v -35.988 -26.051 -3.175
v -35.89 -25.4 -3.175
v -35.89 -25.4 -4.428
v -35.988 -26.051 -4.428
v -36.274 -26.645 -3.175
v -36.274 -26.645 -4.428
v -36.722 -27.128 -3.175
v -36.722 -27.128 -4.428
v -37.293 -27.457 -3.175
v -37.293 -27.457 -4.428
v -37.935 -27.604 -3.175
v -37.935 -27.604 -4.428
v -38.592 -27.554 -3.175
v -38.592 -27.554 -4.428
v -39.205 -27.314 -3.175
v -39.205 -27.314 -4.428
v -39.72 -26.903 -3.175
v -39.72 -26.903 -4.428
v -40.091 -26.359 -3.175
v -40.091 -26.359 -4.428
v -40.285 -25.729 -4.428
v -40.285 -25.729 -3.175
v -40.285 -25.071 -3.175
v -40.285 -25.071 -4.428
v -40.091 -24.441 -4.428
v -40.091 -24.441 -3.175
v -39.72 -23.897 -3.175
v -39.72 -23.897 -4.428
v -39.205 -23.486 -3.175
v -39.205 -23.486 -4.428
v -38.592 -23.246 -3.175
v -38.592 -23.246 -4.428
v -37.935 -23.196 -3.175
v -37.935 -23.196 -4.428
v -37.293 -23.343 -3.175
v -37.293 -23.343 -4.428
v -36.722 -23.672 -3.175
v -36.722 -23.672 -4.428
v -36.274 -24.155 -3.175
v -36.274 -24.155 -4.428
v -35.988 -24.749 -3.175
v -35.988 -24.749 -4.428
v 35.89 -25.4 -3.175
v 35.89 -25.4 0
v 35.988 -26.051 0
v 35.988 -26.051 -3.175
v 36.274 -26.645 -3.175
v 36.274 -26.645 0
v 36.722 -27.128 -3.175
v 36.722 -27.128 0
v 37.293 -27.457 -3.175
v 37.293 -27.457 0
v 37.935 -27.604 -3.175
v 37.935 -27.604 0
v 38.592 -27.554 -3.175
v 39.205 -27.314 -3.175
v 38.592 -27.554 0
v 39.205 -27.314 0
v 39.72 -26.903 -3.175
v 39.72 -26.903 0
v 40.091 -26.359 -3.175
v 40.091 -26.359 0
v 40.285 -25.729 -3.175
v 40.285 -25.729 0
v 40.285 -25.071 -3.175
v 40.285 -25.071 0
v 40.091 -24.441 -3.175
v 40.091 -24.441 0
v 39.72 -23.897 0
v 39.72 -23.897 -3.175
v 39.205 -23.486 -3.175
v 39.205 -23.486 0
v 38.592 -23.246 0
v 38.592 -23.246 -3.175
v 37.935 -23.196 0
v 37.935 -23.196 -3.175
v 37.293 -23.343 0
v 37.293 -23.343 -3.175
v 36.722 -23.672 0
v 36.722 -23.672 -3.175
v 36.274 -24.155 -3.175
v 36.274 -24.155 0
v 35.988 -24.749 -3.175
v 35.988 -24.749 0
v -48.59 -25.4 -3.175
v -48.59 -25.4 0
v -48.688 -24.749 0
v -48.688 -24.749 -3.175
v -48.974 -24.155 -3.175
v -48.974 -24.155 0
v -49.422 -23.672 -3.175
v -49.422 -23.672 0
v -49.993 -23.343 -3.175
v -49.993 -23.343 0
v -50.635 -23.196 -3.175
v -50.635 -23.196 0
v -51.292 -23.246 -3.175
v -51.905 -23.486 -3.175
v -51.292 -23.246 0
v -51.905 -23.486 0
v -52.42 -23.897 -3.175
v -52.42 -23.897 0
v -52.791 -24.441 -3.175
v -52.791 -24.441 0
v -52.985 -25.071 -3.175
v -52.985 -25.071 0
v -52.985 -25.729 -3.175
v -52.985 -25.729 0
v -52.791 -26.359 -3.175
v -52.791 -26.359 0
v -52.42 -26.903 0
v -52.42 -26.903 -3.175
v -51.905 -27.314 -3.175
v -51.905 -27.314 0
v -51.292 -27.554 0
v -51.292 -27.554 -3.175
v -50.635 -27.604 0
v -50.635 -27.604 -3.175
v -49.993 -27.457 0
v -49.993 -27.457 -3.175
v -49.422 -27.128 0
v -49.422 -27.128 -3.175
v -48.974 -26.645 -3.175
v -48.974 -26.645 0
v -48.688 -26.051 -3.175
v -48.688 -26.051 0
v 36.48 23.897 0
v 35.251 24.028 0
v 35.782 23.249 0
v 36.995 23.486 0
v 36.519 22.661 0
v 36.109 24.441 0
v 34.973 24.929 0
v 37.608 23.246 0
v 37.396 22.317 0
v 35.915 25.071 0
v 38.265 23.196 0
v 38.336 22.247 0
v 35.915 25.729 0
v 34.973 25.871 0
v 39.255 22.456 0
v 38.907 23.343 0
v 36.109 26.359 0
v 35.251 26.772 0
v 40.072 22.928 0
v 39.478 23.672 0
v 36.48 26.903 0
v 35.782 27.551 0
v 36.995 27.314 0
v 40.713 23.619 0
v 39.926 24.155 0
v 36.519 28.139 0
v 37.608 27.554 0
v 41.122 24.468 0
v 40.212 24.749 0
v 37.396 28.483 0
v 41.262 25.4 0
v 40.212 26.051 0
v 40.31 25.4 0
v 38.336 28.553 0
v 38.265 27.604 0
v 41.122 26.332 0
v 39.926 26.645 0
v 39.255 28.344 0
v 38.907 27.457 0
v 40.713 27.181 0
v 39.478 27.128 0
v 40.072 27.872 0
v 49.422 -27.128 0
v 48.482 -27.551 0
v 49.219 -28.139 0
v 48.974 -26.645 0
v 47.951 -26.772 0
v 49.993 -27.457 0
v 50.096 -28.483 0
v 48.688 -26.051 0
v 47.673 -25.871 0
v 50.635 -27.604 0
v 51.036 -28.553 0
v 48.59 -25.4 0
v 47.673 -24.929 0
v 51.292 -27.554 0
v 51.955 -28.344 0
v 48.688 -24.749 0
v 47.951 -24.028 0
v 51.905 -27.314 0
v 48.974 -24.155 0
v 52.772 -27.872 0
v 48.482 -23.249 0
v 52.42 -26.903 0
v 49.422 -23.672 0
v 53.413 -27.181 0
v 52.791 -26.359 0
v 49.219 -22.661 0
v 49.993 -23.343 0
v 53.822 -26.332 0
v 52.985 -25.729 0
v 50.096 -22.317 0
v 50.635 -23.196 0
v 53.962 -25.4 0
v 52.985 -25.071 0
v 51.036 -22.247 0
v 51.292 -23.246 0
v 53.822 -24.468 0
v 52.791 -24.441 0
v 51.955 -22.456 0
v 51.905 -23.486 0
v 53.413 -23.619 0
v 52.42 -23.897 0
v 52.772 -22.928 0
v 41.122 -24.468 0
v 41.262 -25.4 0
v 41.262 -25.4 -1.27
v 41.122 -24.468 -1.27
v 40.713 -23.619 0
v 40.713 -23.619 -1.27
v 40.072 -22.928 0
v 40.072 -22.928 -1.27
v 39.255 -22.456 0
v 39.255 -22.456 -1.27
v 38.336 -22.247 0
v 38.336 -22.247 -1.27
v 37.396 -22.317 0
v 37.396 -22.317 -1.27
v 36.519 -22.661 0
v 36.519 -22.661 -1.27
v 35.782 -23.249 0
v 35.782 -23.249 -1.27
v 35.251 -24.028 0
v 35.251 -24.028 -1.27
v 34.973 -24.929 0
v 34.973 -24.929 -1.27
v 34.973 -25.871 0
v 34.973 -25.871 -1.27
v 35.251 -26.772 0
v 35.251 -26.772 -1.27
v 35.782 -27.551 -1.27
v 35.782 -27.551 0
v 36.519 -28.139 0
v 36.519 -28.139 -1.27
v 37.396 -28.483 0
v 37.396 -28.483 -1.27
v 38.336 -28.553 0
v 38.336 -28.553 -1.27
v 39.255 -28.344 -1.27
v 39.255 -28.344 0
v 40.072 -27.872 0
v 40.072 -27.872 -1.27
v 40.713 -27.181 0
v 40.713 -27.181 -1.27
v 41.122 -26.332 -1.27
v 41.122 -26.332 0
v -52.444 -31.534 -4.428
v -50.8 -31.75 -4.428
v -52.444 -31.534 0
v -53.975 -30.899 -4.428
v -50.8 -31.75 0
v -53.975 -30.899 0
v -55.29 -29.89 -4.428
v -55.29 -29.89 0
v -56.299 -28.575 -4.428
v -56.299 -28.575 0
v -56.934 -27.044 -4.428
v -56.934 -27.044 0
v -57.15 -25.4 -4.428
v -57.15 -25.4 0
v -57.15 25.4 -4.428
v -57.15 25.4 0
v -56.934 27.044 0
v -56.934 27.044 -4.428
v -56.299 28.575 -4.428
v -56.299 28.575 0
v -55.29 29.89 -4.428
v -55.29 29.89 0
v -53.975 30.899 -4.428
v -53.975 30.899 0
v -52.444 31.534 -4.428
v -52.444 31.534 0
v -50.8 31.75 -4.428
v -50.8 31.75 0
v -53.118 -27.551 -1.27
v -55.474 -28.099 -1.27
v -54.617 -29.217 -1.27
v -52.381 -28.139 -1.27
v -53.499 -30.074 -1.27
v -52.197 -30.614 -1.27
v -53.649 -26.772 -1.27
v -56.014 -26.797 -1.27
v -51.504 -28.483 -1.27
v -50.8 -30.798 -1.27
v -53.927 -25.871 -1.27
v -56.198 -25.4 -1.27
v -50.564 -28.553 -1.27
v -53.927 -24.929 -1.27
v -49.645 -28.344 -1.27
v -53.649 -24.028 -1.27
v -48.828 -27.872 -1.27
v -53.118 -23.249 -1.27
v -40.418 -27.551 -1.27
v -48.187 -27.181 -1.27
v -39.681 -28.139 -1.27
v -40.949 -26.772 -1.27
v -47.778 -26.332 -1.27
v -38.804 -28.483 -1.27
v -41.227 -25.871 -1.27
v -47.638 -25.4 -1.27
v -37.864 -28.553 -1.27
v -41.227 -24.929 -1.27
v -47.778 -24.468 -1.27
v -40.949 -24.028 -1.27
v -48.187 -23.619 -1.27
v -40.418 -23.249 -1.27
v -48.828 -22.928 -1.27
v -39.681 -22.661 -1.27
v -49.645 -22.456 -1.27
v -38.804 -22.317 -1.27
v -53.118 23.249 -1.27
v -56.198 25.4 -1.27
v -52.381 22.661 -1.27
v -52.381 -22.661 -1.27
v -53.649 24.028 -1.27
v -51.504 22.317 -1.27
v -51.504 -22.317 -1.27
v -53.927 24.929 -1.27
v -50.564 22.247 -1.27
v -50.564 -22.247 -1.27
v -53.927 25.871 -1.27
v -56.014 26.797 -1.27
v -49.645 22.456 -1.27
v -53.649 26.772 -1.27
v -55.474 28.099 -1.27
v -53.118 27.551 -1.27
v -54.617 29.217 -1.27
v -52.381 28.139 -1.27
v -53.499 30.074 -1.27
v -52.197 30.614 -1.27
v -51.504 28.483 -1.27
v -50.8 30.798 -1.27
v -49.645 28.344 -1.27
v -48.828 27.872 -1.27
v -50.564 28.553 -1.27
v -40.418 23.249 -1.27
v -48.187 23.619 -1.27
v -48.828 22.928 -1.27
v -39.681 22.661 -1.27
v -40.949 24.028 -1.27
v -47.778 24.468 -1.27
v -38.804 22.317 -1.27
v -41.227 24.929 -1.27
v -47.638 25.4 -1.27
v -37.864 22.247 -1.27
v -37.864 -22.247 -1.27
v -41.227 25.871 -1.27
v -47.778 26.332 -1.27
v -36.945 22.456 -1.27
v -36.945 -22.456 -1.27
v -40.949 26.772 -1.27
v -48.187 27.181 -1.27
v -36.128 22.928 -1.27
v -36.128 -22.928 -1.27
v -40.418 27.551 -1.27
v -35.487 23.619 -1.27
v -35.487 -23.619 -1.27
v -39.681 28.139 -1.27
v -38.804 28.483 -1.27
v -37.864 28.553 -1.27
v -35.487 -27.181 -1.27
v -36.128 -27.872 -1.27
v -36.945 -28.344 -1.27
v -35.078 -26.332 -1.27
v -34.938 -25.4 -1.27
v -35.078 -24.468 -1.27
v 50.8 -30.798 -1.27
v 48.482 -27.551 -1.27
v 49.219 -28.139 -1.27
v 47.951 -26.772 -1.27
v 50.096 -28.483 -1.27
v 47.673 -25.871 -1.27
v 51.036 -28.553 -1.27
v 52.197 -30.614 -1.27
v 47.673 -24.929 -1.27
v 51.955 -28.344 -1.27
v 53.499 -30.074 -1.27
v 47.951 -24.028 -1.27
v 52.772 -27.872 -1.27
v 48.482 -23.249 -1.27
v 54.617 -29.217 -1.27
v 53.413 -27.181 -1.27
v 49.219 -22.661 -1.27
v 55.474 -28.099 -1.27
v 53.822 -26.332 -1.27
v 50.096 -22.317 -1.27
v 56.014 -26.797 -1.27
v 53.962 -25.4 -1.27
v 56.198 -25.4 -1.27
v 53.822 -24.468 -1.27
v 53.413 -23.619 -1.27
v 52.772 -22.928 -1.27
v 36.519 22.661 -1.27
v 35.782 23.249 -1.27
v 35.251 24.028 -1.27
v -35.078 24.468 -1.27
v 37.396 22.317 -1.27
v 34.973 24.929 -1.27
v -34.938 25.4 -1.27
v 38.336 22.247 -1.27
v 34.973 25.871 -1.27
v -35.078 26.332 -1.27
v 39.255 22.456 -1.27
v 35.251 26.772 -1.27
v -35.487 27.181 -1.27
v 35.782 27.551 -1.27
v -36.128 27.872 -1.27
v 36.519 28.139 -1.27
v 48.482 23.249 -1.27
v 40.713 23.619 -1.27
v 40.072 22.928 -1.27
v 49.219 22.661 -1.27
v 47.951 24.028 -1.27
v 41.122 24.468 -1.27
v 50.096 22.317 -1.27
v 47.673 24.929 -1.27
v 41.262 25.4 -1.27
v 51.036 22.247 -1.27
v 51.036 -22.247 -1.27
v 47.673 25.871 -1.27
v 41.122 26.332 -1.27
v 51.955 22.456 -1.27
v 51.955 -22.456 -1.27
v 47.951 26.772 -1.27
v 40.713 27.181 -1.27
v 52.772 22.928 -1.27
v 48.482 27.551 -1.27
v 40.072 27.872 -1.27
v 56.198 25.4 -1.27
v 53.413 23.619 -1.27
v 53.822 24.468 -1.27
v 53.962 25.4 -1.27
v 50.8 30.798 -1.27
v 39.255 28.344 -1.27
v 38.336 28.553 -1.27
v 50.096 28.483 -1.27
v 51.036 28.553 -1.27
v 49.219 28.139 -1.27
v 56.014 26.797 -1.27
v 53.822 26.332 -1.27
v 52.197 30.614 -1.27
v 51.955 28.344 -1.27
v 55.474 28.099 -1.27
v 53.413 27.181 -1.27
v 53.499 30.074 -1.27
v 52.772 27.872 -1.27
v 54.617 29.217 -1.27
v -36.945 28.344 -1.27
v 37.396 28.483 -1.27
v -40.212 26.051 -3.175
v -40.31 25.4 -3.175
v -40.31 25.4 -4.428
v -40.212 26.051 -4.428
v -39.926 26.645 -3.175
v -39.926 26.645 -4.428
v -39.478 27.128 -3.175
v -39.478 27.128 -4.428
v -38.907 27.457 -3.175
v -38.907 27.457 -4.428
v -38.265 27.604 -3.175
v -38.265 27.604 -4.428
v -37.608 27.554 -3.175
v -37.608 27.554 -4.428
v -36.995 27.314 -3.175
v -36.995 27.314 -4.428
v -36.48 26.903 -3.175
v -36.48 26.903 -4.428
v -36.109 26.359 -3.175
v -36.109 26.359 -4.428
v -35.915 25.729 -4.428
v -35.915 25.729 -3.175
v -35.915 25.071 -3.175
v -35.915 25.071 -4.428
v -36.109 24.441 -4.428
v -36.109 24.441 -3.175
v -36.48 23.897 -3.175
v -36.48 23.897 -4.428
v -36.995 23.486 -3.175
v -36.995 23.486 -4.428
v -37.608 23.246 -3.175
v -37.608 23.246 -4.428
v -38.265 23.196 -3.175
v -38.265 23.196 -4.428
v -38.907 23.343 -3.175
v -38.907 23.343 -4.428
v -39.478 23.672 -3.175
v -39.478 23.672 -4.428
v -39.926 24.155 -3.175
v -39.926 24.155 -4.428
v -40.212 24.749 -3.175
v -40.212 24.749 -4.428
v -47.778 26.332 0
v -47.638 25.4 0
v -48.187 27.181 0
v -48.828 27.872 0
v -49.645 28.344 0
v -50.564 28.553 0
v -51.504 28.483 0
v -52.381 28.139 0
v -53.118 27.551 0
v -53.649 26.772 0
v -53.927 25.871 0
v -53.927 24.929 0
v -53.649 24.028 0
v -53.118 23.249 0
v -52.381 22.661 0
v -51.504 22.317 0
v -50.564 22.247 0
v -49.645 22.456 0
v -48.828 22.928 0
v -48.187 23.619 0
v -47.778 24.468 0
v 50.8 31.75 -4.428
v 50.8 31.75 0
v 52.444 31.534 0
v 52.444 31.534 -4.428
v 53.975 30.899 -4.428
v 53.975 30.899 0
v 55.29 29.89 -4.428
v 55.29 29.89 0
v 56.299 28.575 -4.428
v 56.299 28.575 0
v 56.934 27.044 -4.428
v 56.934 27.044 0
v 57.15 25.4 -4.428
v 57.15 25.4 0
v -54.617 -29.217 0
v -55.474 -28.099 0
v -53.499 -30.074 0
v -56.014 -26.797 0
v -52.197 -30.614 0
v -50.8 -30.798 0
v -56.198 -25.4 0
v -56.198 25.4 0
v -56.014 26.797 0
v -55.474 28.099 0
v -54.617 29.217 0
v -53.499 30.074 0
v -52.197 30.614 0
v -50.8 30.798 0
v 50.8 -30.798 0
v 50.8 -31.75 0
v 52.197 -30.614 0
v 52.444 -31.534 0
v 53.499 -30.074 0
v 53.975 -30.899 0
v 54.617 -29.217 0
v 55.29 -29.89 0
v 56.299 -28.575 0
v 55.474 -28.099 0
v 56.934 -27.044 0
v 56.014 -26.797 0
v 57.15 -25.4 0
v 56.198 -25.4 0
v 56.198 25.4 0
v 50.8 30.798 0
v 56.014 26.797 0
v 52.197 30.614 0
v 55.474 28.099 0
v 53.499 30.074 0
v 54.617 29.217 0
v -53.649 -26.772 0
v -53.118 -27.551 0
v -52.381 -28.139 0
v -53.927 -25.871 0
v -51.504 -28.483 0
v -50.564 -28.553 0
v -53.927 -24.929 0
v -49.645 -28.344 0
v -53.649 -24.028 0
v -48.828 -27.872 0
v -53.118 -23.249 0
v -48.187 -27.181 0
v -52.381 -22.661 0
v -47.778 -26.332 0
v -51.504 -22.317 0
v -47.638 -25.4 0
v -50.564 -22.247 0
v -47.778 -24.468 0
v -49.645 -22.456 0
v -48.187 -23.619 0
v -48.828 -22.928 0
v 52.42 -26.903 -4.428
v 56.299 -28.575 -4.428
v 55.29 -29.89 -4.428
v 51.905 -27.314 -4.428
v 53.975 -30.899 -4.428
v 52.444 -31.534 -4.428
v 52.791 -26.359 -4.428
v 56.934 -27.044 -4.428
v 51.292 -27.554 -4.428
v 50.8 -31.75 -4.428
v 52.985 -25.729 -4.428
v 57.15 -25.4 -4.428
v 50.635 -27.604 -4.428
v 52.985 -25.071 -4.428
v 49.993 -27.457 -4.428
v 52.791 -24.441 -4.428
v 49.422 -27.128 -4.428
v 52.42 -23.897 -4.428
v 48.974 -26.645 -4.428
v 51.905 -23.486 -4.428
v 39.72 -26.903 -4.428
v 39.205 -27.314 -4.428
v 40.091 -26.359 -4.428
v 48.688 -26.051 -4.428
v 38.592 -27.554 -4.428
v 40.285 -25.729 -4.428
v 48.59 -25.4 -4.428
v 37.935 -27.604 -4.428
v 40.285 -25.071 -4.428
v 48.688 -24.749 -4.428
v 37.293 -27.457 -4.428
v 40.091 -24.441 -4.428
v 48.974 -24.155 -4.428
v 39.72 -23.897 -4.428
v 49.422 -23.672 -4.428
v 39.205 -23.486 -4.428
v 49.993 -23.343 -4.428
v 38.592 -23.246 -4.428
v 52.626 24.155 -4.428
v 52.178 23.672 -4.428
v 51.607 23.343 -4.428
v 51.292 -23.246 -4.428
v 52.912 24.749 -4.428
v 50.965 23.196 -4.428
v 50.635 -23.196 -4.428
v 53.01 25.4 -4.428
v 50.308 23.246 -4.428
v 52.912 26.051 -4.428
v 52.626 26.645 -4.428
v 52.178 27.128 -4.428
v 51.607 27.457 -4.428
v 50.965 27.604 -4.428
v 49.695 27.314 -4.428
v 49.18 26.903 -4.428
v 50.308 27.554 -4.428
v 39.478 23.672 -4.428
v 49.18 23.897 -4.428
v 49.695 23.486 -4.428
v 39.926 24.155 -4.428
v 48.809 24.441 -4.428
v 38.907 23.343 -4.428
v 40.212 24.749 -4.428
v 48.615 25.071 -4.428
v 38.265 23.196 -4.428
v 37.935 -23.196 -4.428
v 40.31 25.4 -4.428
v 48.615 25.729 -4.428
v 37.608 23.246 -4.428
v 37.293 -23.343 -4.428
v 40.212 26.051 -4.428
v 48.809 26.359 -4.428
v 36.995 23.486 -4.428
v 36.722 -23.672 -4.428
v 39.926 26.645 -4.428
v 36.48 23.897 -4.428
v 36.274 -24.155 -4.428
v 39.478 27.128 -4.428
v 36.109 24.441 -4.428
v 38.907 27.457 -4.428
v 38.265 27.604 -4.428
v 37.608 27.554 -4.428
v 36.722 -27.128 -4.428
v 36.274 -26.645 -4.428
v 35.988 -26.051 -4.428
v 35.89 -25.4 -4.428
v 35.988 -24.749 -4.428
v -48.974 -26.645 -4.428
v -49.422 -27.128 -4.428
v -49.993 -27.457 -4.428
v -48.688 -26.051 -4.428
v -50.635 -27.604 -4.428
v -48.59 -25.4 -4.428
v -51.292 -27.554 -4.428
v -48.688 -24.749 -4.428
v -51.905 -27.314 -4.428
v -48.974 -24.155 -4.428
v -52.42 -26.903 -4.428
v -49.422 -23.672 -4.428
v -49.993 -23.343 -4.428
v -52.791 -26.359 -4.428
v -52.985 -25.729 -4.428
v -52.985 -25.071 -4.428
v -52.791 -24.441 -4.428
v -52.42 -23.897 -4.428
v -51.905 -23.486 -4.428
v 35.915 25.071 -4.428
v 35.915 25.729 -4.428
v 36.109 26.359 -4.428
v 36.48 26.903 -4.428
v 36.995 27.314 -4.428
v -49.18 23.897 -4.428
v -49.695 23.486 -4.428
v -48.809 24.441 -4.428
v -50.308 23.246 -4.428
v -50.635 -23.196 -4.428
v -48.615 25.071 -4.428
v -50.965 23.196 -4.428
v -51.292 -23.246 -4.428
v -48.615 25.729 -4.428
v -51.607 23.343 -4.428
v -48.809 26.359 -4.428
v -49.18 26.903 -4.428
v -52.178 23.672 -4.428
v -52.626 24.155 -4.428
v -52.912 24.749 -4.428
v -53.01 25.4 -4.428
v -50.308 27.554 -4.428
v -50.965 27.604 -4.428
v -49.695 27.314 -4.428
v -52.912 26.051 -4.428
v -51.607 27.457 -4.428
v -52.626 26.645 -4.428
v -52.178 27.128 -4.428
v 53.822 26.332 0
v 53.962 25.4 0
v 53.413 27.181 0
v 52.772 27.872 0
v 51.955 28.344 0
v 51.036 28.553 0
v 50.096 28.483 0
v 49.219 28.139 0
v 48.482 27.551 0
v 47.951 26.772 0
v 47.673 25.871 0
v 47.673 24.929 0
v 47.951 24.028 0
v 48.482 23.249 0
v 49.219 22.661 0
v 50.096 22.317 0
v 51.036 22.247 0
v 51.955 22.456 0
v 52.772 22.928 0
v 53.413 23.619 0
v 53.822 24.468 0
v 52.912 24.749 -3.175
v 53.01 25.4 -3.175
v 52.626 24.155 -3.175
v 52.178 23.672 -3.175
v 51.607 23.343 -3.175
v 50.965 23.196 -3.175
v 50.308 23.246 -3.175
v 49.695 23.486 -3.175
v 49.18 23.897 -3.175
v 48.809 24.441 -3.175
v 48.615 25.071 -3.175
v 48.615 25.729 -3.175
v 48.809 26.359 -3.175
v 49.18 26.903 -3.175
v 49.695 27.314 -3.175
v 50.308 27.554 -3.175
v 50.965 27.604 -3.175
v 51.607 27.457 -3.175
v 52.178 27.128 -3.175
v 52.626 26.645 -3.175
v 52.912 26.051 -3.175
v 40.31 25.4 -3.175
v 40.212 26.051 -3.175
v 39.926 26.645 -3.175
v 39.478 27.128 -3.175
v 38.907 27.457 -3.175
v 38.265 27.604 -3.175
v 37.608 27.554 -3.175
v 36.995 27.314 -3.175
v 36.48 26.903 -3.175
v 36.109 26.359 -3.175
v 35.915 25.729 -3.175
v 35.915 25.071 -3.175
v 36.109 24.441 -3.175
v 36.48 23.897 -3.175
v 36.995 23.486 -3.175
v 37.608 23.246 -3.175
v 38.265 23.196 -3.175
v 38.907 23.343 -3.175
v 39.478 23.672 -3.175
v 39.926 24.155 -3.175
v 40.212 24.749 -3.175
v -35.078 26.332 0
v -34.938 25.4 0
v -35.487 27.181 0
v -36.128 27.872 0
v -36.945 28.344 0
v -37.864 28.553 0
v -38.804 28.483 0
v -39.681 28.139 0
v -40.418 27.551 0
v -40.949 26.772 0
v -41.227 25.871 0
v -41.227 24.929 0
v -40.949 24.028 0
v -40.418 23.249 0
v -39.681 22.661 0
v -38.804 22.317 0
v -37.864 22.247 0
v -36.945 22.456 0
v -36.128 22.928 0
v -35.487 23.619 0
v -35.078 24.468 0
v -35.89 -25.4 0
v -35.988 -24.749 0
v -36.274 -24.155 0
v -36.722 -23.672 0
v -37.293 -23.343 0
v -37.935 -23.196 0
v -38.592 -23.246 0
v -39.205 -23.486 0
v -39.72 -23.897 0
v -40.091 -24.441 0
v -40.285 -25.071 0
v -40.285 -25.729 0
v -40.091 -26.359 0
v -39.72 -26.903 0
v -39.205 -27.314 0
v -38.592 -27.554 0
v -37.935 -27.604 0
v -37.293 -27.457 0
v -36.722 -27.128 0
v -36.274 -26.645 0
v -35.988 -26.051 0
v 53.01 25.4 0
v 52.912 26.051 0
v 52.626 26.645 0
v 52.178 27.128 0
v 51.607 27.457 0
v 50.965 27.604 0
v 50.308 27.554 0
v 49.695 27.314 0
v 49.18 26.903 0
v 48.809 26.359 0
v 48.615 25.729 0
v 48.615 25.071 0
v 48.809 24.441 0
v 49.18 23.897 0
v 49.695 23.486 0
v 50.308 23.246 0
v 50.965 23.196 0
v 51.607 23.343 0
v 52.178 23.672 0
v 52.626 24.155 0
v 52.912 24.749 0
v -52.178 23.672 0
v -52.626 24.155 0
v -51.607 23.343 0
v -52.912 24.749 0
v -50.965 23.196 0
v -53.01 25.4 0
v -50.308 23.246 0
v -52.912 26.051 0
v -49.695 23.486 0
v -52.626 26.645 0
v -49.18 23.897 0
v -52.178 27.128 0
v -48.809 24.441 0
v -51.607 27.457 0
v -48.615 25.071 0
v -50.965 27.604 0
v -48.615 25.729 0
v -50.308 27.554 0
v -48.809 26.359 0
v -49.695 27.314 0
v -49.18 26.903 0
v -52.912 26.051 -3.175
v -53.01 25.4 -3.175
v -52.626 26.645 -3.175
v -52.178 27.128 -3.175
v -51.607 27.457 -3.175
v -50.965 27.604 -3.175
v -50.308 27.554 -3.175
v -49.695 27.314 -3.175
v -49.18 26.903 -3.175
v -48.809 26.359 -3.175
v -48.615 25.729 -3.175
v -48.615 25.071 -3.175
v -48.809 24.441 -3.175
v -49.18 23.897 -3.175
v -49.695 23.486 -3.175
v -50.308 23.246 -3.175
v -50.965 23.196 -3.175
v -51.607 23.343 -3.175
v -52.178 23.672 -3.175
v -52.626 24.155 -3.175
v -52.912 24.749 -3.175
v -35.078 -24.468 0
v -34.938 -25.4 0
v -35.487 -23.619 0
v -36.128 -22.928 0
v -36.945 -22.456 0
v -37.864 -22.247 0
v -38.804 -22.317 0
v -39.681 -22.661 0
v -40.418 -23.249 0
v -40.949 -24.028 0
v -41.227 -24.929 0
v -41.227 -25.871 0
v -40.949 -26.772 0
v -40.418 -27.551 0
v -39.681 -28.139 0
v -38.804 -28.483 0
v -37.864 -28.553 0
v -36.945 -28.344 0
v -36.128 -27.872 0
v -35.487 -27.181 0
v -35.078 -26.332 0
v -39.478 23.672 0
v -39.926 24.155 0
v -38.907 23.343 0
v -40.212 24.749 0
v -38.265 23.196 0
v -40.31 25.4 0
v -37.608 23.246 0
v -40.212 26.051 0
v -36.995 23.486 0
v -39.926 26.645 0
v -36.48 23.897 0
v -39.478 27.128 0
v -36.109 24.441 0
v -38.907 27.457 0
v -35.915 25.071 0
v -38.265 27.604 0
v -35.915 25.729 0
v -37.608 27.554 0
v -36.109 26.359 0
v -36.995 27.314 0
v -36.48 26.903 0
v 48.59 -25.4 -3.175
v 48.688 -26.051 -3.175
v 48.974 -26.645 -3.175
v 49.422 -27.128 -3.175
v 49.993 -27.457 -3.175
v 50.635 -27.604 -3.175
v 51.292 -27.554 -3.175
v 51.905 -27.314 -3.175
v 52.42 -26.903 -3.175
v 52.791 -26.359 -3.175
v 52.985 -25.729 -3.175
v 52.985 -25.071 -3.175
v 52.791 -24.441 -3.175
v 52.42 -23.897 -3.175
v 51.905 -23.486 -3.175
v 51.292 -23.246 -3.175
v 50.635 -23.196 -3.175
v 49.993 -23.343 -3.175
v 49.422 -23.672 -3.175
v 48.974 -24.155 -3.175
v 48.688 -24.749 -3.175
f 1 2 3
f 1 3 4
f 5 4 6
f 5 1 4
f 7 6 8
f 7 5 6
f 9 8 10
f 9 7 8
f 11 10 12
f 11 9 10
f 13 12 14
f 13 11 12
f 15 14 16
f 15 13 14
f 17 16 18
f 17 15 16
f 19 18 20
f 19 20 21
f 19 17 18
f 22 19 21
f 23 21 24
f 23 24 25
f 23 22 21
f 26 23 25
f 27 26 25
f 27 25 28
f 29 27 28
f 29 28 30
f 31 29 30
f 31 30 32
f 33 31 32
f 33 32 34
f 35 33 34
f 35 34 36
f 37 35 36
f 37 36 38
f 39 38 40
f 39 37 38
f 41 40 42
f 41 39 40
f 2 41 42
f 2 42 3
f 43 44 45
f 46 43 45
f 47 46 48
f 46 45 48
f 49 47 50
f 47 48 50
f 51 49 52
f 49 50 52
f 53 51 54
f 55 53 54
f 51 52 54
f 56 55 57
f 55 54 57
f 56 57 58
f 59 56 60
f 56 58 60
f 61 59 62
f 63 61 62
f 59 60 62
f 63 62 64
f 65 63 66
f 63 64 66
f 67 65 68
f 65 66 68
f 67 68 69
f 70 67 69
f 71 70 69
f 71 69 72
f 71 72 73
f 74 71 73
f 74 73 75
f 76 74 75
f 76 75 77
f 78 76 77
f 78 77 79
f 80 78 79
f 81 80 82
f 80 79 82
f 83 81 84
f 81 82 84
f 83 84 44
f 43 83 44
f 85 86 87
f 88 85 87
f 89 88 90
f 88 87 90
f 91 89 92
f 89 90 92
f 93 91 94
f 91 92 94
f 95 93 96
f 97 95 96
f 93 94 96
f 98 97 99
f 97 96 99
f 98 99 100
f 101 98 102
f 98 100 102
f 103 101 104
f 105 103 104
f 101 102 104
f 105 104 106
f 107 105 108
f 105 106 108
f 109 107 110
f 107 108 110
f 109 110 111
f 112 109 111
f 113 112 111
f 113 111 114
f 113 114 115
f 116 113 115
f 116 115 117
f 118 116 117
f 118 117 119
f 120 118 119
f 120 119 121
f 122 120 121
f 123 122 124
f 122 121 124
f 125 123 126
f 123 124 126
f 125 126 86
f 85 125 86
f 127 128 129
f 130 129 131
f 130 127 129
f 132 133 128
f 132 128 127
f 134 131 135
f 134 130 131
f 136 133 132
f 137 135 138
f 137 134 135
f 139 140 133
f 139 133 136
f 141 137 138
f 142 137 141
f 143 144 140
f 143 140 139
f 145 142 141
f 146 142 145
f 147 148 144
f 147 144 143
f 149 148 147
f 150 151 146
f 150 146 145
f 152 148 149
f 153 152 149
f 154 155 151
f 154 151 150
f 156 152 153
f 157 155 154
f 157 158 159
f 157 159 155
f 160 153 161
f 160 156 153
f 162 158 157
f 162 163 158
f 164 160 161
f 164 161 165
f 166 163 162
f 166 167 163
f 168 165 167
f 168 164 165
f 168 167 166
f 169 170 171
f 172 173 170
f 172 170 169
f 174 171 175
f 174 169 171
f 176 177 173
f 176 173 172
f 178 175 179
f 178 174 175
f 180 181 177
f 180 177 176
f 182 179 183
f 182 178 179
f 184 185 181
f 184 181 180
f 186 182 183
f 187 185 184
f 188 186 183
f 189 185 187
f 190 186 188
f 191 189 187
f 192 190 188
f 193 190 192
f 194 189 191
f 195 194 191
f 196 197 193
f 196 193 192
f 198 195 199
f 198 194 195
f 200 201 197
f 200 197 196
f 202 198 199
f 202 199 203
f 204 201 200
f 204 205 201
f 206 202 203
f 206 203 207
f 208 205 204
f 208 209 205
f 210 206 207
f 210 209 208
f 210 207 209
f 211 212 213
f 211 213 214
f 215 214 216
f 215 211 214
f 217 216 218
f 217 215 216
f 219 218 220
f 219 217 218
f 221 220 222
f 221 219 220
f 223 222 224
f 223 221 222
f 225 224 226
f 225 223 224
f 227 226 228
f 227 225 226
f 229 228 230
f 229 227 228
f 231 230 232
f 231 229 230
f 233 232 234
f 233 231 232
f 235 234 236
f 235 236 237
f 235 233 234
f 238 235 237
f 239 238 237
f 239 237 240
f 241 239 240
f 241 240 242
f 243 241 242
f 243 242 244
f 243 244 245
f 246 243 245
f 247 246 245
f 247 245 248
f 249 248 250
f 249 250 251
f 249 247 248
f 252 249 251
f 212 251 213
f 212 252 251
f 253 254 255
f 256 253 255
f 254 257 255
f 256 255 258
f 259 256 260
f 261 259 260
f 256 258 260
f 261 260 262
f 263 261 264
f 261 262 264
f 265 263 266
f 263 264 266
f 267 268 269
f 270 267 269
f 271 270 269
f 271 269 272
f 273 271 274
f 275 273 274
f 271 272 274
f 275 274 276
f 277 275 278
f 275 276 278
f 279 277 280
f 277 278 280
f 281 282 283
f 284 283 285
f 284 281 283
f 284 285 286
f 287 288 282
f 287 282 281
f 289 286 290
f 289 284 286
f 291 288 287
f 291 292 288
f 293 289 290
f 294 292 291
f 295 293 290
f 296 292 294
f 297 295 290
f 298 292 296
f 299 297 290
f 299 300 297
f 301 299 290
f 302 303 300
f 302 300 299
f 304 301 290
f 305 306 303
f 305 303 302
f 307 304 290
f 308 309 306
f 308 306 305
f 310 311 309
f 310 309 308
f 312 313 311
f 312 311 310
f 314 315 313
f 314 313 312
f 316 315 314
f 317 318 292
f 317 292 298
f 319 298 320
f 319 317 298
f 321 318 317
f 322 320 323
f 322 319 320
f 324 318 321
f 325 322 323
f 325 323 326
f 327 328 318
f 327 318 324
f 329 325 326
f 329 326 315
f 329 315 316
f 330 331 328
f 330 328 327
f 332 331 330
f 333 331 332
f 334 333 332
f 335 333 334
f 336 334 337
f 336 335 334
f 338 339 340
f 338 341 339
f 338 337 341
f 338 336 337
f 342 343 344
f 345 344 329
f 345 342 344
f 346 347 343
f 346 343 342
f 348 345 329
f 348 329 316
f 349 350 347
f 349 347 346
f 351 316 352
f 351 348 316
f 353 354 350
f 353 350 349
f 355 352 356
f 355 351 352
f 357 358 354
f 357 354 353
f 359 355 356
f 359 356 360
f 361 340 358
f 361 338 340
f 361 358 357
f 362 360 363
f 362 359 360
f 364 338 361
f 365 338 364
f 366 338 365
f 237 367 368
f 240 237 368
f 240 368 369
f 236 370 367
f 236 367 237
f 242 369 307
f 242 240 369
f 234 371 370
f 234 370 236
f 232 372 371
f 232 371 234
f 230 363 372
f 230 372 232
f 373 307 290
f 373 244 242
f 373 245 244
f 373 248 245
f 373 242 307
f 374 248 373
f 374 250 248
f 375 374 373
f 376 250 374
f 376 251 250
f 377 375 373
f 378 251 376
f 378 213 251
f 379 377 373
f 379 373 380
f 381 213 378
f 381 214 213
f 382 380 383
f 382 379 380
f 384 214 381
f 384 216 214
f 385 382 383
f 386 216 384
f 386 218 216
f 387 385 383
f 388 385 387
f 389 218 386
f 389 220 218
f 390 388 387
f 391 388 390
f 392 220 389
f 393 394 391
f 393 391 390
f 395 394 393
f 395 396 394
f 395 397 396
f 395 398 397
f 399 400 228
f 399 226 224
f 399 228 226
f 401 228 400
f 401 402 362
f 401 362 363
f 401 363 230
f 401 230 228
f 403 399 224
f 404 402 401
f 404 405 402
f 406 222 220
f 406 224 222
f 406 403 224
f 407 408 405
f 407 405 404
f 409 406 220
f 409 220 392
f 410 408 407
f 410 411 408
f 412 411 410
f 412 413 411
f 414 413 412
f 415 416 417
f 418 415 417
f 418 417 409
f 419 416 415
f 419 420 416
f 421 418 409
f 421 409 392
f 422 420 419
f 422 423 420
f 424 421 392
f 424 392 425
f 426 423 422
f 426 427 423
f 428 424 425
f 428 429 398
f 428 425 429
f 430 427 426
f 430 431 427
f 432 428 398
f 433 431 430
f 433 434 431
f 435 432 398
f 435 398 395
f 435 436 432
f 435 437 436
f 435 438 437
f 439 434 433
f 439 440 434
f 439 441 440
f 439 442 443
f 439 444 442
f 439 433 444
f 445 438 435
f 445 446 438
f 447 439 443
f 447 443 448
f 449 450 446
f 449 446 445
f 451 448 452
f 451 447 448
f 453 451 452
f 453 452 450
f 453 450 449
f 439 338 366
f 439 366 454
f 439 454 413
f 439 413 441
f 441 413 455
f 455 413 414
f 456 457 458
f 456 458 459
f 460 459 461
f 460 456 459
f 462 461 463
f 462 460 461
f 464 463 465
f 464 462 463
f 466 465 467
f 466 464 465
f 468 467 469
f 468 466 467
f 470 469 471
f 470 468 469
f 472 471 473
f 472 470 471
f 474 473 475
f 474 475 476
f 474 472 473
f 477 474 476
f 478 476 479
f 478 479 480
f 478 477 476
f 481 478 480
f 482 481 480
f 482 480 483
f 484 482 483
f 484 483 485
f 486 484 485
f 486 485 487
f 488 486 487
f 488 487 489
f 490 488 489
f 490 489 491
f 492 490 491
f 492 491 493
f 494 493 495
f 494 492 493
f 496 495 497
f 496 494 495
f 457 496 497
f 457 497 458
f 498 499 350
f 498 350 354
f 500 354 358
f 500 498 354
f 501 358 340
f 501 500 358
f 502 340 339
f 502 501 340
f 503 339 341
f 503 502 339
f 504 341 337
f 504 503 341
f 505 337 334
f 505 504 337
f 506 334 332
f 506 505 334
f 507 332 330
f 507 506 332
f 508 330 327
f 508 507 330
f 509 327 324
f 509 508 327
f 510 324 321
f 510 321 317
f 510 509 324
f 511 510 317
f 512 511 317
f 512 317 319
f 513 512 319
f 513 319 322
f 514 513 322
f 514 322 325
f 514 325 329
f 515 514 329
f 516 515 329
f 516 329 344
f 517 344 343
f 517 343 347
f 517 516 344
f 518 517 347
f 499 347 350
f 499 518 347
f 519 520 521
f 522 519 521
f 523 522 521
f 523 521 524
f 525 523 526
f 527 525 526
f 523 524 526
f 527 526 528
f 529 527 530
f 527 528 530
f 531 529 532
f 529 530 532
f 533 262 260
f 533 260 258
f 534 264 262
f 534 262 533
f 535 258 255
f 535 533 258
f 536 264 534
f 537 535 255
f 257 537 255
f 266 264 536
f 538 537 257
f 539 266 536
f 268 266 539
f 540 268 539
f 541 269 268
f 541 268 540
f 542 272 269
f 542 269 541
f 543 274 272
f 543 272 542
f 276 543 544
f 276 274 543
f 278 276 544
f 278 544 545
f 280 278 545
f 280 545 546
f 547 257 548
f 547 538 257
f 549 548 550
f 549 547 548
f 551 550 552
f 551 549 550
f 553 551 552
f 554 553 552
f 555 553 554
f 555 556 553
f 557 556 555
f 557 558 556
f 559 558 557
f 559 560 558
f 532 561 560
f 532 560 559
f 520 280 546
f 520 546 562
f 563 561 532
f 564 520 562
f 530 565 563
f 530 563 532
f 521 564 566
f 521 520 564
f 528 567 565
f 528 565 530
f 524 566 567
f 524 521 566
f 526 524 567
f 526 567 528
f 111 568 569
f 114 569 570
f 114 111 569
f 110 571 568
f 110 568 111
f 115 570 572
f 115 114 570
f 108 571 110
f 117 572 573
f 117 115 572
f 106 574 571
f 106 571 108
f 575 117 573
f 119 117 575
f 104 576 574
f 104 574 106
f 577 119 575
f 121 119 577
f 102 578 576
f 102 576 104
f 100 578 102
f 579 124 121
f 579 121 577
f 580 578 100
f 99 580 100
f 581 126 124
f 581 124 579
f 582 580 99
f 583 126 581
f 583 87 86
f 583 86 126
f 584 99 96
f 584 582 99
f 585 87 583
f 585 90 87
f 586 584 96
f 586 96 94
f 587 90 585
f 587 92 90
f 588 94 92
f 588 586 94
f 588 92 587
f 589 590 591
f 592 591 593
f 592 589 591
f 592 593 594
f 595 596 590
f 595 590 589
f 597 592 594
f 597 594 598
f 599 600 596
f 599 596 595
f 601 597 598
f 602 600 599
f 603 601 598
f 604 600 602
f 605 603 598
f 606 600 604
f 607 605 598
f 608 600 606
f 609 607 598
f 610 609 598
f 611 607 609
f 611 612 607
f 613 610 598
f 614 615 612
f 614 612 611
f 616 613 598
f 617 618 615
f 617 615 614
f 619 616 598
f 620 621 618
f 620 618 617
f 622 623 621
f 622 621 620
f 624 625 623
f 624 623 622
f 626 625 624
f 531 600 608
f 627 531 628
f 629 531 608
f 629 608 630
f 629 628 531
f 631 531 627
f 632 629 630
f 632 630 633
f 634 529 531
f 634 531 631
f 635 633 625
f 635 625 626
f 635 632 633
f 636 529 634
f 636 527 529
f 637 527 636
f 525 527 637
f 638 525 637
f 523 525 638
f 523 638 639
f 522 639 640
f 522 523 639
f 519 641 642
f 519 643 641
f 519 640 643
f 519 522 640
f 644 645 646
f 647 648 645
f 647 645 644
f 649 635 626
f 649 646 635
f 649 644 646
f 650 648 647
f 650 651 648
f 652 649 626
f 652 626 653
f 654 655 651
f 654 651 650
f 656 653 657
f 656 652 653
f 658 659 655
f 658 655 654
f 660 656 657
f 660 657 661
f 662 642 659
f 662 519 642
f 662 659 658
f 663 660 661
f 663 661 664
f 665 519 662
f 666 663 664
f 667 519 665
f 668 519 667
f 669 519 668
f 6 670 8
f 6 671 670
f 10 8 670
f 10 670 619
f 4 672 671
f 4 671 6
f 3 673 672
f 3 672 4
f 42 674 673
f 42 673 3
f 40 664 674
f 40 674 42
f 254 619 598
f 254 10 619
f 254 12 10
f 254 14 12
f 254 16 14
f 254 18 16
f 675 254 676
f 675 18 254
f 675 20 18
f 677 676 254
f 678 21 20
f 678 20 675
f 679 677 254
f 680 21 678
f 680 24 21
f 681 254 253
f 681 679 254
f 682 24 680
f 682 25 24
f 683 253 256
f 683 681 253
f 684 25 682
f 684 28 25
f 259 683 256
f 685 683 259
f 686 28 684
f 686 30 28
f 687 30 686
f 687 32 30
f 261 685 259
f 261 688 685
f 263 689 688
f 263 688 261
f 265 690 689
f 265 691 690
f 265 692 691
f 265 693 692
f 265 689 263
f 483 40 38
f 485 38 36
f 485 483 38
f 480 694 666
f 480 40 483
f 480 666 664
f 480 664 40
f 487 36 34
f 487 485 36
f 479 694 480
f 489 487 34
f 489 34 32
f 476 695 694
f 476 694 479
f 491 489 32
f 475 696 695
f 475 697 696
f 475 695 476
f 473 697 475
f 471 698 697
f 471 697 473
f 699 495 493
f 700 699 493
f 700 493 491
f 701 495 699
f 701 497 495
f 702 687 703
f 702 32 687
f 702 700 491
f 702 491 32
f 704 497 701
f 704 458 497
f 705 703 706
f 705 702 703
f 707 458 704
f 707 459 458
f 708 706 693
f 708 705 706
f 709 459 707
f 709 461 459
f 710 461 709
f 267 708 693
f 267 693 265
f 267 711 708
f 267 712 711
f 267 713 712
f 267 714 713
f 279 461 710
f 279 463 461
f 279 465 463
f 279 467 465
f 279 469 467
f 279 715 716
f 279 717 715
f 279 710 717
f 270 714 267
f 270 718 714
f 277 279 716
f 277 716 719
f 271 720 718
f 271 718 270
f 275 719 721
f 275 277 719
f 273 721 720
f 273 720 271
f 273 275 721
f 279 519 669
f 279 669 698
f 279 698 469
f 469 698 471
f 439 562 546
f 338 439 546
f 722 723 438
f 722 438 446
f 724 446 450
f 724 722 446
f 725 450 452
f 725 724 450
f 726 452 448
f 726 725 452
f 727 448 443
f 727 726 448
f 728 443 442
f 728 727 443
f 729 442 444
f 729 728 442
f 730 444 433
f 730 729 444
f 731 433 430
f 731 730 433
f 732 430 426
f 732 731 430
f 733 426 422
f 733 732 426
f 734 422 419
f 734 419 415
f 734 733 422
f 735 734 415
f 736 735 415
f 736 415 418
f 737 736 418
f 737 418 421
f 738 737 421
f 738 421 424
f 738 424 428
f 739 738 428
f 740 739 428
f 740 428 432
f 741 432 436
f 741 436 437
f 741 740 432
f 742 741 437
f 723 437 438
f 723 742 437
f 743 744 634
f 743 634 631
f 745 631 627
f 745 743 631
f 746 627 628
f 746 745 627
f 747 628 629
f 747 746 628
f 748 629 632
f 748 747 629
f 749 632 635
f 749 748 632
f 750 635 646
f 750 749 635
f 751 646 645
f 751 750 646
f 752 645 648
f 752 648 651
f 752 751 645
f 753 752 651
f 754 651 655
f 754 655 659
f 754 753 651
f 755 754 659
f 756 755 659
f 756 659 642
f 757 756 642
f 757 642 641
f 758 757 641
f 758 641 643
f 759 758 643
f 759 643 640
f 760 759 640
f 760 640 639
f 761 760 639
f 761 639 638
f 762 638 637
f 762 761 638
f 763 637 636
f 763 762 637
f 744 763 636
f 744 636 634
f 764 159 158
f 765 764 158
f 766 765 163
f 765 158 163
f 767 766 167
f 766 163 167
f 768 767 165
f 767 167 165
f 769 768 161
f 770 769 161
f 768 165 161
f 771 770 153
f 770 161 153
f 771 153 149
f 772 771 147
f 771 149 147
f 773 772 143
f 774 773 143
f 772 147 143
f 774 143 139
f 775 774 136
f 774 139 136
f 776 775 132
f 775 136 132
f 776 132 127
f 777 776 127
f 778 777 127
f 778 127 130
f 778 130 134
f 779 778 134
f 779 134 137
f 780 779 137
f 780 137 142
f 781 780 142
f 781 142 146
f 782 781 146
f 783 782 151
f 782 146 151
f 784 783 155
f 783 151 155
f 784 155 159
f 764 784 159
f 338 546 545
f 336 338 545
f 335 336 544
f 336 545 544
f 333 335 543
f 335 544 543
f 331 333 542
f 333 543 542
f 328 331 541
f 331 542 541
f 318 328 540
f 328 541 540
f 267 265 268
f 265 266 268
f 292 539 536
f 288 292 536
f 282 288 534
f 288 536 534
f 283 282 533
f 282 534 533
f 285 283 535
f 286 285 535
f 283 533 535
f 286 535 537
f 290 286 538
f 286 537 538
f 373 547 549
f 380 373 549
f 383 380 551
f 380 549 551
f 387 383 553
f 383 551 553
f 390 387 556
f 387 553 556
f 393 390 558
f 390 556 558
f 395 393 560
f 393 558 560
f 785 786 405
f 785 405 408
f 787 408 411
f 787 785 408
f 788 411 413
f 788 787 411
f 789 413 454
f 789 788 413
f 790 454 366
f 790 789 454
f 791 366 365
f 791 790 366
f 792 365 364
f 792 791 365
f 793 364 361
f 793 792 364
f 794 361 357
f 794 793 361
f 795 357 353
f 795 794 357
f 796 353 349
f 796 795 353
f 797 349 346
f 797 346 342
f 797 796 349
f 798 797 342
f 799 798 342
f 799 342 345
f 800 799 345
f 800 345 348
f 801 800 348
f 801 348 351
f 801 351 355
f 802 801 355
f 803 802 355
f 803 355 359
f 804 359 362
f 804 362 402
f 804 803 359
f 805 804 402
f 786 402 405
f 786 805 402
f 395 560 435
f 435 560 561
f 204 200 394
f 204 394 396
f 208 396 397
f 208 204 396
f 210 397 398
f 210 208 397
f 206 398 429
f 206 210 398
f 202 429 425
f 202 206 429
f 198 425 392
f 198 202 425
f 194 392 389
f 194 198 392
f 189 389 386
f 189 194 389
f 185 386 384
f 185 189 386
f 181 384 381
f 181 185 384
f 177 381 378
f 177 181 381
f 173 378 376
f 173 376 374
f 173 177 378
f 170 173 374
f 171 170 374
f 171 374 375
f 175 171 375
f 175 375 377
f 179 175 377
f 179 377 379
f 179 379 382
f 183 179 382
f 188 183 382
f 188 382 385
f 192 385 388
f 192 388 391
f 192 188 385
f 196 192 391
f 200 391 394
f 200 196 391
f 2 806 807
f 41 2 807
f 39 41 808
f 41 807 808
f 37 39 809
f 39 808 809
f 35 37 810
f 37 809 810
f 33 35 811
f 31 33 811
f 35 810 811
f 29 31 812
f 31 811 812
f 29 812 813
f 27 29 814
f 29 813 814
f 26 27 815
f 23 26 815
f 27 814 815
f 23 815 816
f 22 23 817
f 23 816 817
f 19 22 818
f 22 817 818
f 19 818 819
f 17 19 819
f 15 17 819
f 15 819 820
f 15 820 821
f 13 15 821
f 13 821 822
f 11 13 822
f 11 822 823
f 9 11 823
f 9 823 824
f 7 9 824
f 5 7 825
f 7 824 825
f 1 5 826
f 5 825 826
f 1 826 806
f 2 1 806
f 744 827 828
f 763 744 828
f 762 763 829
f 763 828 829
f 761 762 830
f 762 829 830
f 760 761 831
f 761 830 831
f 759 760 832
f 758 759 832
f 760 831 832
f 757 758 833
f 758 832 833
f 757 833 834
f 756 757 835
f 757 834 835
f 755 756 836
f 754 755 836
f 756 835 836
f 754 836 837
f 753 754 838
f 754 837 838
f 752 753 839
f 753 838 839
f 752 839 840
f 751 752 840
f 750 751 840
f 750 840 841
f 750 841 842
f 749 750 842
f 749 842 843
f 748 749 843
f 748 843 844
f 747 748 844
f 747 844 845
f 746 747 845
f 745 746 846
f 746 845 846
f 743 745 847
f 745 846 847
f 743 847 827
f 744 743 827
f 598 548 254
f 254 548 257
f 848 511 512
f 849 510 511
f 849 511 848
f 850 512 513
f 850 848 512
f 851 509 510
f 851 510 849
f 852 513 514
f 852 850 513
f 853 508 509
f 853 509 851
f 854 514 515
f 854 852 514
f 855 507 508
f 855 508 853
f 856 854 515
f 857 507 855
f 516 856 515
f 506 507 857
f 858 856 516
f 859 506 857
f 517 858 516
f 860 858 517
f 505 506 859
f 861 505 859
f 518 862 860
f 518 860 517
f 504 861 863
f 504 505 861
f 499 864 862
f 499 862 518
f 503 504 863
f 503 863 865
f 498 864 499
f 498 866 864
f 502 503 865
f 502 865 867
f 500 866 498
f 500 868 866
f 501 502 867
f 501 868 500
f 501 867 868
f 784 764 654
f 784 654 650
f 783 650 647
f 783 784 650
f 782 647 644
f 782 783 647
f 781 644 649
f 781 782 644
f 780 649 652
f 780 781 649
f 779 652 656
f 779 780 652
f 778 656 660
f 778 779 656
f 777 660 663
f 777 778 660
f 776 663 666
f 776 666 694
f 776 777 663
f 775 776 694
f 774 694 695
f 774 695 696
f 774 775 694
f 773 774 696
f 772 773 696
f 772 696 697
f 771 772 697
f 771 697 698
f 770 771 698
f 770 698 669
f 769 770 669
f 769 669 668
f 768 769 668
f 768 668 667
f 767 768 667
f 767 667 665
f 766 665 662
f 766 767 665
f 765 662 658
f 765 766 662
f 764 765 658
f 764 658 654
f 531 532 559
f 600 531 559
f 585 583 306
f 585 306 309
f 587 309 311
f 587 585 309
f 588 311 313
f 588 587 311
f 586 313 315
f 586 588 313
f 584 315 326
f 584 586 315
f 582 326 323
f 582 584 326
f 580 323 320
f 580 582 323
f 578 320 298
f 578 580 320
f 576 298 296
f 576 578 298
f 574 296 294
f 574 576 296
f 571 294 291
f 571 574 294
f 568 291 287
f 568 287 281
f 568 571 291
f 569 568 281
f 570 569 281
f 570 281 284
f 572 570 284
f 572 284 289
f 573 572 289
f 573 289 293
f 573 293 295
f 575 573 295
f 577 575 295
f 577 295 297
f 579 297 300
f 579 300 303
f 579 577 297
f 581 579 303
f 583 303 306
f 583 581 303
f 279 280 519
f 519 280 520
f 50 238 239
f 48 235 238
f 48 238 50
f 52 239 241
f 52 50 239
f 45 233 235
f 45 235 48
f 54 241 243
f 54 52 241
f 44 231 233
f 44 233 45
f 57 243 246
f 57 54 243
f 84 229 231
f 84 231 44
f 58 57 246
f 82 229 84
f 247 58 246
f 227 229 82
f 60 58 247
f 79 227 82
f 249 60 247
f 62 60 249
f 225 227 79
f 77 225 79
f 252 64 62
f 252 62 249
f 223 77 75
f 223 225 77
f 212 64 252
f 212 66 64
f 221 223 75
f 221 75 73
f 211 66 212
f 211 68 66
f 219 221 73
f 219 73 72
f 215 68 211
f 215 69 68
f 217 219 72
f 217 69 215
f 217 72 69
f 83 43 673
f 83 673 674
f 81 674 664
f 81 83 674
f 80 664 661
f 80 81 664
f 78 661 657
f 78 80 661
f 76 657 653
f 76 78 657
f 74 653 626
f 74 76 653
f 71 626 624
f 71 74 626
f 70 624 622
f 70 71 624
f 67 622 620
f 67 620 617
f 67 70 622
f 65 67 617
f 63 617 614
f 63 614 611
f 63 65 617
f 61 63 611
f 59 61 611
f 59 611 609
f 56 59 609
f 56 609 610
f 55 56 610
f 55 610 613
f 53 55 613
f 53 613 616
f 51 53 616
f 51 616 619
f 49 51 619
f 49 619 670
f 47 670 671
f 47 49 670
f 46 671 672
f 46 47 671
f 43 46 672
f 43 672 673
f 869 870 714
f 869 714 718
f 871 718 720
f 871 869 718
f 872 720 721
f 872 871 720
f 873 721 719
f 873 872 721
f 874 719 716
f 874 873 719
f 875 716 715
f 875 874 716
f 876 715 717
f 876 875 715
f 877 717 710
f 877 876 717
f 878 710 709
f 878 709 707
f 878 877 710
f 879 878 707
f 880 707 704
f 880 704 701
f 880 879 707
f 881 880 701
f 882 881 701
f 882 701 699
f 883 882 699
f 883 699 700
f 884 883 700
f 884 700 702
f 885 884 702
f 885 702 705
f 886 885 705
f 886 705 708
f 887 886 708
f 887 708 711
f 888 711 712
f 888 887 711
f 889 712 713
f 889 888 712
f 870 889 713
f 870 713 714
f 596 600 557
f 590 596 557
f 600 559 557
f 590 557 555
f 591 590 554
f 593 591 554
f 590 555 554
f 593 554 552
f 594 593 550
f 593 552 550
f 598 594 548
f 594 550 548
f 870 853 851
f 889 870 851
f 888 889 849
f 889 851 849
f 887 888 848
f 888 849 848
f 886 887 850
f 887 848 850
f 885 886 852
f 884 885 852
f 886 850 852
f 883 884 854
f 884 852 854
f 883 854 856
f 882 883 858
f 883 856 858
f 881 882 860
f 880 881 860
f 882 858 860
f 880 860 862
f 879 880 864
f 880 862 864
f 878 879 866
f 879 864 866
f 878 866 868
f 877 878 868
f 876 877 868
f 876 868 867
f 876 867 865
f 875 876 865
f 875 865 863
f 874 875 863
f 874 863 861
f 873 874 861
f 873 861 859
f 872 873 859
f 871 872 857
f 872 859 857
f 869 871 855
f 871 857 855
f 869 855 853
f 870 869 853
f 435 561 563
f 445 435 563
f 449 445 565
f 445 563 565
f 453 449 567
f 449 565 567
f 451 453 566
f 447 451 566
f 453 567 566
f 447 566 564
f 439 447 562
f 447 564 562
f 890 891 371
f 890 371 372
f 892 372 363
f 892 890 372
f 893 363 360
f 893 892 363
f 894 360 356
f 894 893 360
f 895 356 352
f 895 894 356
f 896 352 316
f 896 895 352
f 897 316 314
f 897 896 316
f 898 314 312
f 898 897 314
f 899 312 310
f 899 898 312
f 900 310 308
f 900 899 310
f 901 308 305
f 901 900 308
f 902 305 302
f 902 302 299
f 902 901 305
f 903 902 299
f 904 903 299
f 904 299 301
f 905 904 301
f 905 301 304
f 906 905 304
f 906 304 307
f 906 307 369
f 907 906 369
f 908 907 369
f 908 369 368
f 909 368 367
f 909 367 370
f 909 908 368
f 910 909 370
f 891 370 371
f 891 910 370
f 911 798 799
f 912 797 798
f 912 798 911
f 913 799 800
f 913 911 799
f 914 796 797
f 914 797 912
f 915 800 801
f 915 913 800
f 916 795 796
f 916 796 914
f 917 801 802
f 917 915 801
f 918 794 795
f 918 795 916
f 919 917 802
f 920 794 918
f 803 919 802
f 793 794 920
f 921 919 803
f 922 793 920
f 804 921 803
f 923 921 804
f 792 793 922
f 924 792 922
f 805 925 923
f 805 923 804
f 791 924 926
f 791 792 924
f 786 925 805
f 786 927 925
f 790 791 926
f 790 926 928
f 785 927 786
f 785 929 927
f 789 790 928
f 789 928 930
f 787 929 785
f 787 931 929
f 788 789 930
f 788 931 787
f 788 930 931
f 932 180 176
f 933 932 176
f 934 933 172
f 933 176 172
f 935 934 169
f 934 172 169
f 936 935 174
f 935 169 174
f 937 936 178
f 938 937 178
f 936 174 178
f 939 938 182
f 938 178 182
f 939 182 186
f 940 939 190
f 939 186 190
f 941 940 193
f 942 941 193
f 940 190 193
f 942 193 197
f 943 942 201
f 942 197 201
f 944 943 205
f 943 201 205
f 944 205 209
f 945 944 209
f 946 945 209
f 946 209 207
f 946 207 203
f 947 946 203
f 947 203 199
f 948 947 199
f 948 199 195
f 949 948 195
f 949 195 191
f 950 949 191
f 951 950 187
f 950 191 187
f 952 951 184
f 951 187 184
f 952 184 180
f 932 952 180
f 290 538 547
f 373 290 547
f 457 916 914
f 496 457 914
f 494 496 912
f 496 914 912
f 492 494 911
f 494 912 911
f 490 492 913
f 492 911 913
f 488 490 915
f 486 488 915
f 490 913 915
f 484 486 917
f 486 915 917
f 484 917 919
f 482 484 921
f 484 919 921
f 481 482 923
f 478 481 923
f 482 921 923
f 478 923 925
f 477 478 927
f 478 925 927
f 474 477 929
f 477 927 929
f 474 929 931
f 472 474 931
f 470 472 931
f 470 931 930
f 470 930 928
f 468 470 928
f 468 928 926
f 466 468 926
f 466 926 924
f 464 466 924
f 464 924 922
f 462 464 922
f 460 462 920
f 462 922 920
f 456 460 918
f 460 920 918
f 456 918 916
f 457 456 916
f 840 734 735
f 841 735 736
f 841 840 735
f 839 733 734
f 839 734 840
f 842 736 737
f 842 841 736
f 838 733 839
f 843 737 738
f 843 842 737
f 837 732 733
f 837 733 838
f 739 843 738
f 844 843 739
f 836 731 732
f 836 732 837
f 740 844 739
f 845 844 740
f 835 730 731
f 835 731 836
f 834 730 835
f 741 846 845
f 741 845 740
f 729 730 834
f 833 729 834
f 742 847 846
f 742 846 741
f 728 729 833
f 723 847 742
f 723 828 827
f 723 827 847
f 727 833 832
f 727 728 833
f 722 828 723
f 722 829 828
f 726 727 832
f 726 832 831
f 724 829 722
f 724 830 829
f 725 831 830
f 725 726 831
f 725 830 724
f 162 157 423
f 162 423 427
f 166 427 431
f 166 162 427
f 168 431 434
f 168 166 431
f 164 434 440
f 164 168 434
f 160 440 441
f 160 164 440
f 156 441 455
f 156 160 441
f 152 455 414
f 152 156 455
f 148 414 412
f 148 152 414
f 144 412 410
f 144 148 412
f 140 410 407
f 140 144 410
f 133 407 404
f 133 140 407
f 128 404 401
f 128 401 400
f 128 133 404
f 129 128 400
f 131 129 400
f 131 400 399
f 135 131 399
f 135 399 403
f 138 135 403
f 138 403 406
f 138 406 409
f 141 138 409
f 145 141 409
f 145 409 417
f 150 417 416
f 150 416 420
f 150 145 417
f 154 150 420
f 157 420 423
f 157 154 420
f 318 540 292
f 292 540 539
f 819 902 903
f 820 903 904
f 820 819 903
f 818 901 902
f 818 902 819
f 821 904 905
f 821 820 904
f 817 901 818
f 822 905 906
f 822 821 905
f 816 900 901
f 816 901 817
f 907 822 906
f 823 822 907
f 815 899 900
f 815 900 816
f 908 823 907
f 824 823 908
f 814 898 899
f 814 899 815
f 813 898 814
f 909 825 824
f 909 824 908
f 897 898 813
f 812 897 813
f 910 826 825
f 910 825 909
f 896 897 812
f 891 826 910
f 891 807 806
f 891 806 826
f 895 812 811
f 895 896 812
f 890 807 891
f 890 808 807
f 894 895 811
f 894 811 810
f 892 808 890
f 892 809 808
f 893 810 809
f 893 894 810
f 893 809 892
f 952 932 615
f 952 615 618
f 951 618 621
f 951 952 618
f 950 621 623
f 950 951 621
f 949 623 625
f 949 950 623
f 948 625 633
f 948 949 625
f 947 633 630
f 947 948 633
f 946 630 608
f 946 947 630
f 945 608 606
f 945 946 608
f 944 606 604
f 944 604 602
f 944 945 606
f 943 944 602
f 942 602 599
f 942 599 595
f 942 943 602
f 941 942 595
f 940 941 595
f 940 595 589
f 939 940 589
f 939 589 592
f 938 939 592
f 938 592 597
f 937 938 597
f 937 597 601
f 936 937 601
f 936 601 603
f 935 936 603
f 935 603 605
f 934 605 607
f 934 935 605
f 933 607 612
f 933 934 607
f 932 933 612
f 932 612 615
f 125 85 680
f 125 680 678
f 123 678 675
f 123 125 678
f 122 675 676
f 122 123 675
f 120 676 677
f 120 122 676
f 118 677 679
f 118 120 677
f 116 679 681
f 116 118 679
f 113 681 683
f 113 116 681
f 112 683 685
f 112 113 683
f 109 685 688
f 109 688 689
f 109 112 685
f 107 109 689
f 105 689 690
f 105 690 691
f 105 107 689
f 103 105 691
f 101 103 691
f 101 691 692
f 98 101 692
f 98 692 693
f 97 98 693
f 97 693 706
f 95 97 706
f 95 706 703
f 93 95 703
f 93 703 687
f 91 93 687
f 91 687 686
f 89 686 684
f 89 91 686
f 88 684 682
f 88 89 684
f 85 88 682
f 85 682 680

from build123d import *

# Parameters (mm, degrees)
SKETCH1_R           = 2.2098
BOSS_EXTRUDE1_DEPTH = 3.175
SKETCH2_R           = 3.1623
CUT_EXTRUDE3_DEPTH  = 1.27
SKETCH3_R           = 2.2098
BOSS_EXTRUDE2_DEPTH = 1.253000034


with BuildPart() as part:
    # Sketch1 → Boss-Extrude1 (new body)
    with BuildSketch(Plane.XY):
        with BuildLine():
            Line((-50.8, -31.75), (50.8, -31.75))
            ThreePointArc((50.8, -31.75), (55.290128061, -29.890128061), (57.15, -25.4))
            Line((57.15, -25.4), (57.15, 25.4))
            ThreePointArc((57.15, 25.4), (55.290128061, 29.890128061), (50.8, 31.75))
            Line((50.8, 31.75), (-50.8, 31.75))
            ThreePointArc((-50.8, 31.75), (-55.290128061, 29.890128061), (-57.15, 25.4))
            Line((-57.15, 25.4), (-57.15, -25.4))
            ThreePointArc((-57.15, -25.4), (-55.290128061, -29.890128061), (-50.8, -31.75))
        make_face()
        with Locations((-50.8, -25.4)):
            Circle(SKETCH1_R, mode=Mode.SUBTRACT)
        with Locations((-38.1, -25.4)):
            Circle(SKETCH1_R, mode=Mode.SUBTRACT)
        with Locations(Location((-50.8, 25.4, 0), (0, 0, 180))):
            Circle(SKETCH1_R, mode=Mode.SUBTRACT)
        with Locations(Location((-38.1, 25.4, 0), (0, 0, 180))):
            Circle(SKETCH1_R, mode=Mode.SUBTRACT)
        with Locations((50.8, 25.4)):
            Circle(SKETCH1_R, mode=Mode.SUBTRACT)
        with Locations((38.1, 25.4)):
            Circle(SKETCH1_R, mode=Mode.SUBTRACT)
        with Locations(Location((50.8, -25.4, 0), (0, 0, 180))):
            Circle(SKETCH1_R, mode=Mode.SUBTRACT)
        with Locations(Location((38.1, -25.4, 0), (0, 0, 180))):
            Circle(SKETCH1_R, mode=Mode.SUBTRACT)
    extrude(amount=-BOSS_EXTRUDE1_DEPTH)

    # Sketch2 → Cut-Extrude3 (cut)
    with BuildSketch(Plane.XY):
        with BuildLine():
            Line((50.8, 30.7975), (-50.8, 30.7975))
            ThreePointArc((-50.8, 30.7975), (-54.616608851, 29.216608851), (-56.1975, 25.4))
            Line((-56.1975, 25.4), (-56.1975, -25.4))
            ThreePointArc((-56.1975, -25.4), (-54.616608851, -29.216608851), (-50.8, -30.7975))
            Line((-50.8, -30.7975), (50.8, -30.7975))
            ThreePointArc((50.8, -30.7975), (54.616608851, -29.216608851), (56.1975, -25.4))
            Line((56.1975, -25.4), (56.1975, 25.4))
            ThreePointArc((56.1975, 25.4), (54.616608851, 29.216608851), (50.8, 30.7975))
        make_face()
        with Locations((38.1, 25.4)):
            Circle(SKETCH2_R, mode=Mode.SUBTRACT)
        with Locations((50.8, 25.4)):
            Circle(SKETCH2_R, mode=Mode.SUBTRACT)
        with Locations((50.8, -25.4)):
            Circle(SKETCH2_R, mode=Mode.SUBTRACT)
        with Locations((38.1, -25.4)):
            Circle(SKETCH2_R, mode=Mode.SUBTRACT)
        with Locations((-38.1, -25.4)):
            Circle(SKETCH2_R, mode=Mode.SUBTRACT)
        with Locations((-50.8, -25.4)):
            Circle(SKETCH2_R, mode=Mode.SUBTRACT)
        with Locations((-38.1, 25.4)):
            Circle(SKETCH2_R, mode=Mode.SUBTRACT)
        with Locations((-50.8, 25.4)):
            Circle(SKETCH2_R, mode=Mode.SUBTRACT)
    extrude(amount=-CUT_EXTRUDE3_DEPTH, mode=Mode.SUBTRACT)

    # Sketch3 → Boss-Extrude2 (add)
    with BuildSketch(Plane(origin=(0, 0, -3.175), x_dir=(-1, 0, 0), z_dir=(0, 0, -1))):
        with BuildLine():
            Line((-57.15, 25.4), (-57.15, -25.4))
            ThreePointArc((-57.15, -25.4), (-55.290128061, -29.890128061), (-50.8, -31.75))
            Line((-50.8, -31.75), (50.8, -31.75))
            ThreePointArc((50.8, -31.75), (55.290128061, -29.890128061), (57.15, -25.4))
            Line((57.15, -25.4), (57.15, 25.4))
            ThreePointArc((57.15, 25.4), (55.290128061, 29.890128061), (50.8, 31.75))
            Line((50.8, 31.75), (-50.8, 31.75))
            ThreePointArc((-50.8, 31.75), (-55.290128061, 29.890128061), (-57.15, 25.4))
        make_face()
        with Locations((-50.8, -25.4)):
            Circle(SKETCH3_R, mode=Mode.SUBTRACT)
        with Locations((-38.1, -25.4)):
            Circle(SKETCH3_R, mode=Mode.SUBTRACT)
        with Locations(Location((38.1, -25.4, 0), (0, 0, 180))):
            Circle(SKETCH3_R, mode=Mode.SUBTRACT)
        with Locations(Location((50.8, -25.4, 0), (0, 0, 180))):
            Circle(SKETCH3_R, mode=Mode.SUBTRACT)
        with Locations((50.8, 25.4)):
            Circle(SKETCH3_R, mode=Mode.SUBTRACT)
        with Locations((38.1, 25.4)):
            Circle(SKETCH3_R, mode=Mode.SUBTRACT)
        with Locations(Location((-38.1, 25.4, 0), (0, 0, 180))):
            Circle(SKETCH3_R, mode=Mode.SUBTRACT)
        with Locations(Location((-50.8, 25.4, 0), (0, 0, 180))):
            Circle(SKETCH3_R, mode=Mode.SUBTRACT)
    extrude(amount=BOSS_EXTRUDE2_DEPTH)


solid = part.part
